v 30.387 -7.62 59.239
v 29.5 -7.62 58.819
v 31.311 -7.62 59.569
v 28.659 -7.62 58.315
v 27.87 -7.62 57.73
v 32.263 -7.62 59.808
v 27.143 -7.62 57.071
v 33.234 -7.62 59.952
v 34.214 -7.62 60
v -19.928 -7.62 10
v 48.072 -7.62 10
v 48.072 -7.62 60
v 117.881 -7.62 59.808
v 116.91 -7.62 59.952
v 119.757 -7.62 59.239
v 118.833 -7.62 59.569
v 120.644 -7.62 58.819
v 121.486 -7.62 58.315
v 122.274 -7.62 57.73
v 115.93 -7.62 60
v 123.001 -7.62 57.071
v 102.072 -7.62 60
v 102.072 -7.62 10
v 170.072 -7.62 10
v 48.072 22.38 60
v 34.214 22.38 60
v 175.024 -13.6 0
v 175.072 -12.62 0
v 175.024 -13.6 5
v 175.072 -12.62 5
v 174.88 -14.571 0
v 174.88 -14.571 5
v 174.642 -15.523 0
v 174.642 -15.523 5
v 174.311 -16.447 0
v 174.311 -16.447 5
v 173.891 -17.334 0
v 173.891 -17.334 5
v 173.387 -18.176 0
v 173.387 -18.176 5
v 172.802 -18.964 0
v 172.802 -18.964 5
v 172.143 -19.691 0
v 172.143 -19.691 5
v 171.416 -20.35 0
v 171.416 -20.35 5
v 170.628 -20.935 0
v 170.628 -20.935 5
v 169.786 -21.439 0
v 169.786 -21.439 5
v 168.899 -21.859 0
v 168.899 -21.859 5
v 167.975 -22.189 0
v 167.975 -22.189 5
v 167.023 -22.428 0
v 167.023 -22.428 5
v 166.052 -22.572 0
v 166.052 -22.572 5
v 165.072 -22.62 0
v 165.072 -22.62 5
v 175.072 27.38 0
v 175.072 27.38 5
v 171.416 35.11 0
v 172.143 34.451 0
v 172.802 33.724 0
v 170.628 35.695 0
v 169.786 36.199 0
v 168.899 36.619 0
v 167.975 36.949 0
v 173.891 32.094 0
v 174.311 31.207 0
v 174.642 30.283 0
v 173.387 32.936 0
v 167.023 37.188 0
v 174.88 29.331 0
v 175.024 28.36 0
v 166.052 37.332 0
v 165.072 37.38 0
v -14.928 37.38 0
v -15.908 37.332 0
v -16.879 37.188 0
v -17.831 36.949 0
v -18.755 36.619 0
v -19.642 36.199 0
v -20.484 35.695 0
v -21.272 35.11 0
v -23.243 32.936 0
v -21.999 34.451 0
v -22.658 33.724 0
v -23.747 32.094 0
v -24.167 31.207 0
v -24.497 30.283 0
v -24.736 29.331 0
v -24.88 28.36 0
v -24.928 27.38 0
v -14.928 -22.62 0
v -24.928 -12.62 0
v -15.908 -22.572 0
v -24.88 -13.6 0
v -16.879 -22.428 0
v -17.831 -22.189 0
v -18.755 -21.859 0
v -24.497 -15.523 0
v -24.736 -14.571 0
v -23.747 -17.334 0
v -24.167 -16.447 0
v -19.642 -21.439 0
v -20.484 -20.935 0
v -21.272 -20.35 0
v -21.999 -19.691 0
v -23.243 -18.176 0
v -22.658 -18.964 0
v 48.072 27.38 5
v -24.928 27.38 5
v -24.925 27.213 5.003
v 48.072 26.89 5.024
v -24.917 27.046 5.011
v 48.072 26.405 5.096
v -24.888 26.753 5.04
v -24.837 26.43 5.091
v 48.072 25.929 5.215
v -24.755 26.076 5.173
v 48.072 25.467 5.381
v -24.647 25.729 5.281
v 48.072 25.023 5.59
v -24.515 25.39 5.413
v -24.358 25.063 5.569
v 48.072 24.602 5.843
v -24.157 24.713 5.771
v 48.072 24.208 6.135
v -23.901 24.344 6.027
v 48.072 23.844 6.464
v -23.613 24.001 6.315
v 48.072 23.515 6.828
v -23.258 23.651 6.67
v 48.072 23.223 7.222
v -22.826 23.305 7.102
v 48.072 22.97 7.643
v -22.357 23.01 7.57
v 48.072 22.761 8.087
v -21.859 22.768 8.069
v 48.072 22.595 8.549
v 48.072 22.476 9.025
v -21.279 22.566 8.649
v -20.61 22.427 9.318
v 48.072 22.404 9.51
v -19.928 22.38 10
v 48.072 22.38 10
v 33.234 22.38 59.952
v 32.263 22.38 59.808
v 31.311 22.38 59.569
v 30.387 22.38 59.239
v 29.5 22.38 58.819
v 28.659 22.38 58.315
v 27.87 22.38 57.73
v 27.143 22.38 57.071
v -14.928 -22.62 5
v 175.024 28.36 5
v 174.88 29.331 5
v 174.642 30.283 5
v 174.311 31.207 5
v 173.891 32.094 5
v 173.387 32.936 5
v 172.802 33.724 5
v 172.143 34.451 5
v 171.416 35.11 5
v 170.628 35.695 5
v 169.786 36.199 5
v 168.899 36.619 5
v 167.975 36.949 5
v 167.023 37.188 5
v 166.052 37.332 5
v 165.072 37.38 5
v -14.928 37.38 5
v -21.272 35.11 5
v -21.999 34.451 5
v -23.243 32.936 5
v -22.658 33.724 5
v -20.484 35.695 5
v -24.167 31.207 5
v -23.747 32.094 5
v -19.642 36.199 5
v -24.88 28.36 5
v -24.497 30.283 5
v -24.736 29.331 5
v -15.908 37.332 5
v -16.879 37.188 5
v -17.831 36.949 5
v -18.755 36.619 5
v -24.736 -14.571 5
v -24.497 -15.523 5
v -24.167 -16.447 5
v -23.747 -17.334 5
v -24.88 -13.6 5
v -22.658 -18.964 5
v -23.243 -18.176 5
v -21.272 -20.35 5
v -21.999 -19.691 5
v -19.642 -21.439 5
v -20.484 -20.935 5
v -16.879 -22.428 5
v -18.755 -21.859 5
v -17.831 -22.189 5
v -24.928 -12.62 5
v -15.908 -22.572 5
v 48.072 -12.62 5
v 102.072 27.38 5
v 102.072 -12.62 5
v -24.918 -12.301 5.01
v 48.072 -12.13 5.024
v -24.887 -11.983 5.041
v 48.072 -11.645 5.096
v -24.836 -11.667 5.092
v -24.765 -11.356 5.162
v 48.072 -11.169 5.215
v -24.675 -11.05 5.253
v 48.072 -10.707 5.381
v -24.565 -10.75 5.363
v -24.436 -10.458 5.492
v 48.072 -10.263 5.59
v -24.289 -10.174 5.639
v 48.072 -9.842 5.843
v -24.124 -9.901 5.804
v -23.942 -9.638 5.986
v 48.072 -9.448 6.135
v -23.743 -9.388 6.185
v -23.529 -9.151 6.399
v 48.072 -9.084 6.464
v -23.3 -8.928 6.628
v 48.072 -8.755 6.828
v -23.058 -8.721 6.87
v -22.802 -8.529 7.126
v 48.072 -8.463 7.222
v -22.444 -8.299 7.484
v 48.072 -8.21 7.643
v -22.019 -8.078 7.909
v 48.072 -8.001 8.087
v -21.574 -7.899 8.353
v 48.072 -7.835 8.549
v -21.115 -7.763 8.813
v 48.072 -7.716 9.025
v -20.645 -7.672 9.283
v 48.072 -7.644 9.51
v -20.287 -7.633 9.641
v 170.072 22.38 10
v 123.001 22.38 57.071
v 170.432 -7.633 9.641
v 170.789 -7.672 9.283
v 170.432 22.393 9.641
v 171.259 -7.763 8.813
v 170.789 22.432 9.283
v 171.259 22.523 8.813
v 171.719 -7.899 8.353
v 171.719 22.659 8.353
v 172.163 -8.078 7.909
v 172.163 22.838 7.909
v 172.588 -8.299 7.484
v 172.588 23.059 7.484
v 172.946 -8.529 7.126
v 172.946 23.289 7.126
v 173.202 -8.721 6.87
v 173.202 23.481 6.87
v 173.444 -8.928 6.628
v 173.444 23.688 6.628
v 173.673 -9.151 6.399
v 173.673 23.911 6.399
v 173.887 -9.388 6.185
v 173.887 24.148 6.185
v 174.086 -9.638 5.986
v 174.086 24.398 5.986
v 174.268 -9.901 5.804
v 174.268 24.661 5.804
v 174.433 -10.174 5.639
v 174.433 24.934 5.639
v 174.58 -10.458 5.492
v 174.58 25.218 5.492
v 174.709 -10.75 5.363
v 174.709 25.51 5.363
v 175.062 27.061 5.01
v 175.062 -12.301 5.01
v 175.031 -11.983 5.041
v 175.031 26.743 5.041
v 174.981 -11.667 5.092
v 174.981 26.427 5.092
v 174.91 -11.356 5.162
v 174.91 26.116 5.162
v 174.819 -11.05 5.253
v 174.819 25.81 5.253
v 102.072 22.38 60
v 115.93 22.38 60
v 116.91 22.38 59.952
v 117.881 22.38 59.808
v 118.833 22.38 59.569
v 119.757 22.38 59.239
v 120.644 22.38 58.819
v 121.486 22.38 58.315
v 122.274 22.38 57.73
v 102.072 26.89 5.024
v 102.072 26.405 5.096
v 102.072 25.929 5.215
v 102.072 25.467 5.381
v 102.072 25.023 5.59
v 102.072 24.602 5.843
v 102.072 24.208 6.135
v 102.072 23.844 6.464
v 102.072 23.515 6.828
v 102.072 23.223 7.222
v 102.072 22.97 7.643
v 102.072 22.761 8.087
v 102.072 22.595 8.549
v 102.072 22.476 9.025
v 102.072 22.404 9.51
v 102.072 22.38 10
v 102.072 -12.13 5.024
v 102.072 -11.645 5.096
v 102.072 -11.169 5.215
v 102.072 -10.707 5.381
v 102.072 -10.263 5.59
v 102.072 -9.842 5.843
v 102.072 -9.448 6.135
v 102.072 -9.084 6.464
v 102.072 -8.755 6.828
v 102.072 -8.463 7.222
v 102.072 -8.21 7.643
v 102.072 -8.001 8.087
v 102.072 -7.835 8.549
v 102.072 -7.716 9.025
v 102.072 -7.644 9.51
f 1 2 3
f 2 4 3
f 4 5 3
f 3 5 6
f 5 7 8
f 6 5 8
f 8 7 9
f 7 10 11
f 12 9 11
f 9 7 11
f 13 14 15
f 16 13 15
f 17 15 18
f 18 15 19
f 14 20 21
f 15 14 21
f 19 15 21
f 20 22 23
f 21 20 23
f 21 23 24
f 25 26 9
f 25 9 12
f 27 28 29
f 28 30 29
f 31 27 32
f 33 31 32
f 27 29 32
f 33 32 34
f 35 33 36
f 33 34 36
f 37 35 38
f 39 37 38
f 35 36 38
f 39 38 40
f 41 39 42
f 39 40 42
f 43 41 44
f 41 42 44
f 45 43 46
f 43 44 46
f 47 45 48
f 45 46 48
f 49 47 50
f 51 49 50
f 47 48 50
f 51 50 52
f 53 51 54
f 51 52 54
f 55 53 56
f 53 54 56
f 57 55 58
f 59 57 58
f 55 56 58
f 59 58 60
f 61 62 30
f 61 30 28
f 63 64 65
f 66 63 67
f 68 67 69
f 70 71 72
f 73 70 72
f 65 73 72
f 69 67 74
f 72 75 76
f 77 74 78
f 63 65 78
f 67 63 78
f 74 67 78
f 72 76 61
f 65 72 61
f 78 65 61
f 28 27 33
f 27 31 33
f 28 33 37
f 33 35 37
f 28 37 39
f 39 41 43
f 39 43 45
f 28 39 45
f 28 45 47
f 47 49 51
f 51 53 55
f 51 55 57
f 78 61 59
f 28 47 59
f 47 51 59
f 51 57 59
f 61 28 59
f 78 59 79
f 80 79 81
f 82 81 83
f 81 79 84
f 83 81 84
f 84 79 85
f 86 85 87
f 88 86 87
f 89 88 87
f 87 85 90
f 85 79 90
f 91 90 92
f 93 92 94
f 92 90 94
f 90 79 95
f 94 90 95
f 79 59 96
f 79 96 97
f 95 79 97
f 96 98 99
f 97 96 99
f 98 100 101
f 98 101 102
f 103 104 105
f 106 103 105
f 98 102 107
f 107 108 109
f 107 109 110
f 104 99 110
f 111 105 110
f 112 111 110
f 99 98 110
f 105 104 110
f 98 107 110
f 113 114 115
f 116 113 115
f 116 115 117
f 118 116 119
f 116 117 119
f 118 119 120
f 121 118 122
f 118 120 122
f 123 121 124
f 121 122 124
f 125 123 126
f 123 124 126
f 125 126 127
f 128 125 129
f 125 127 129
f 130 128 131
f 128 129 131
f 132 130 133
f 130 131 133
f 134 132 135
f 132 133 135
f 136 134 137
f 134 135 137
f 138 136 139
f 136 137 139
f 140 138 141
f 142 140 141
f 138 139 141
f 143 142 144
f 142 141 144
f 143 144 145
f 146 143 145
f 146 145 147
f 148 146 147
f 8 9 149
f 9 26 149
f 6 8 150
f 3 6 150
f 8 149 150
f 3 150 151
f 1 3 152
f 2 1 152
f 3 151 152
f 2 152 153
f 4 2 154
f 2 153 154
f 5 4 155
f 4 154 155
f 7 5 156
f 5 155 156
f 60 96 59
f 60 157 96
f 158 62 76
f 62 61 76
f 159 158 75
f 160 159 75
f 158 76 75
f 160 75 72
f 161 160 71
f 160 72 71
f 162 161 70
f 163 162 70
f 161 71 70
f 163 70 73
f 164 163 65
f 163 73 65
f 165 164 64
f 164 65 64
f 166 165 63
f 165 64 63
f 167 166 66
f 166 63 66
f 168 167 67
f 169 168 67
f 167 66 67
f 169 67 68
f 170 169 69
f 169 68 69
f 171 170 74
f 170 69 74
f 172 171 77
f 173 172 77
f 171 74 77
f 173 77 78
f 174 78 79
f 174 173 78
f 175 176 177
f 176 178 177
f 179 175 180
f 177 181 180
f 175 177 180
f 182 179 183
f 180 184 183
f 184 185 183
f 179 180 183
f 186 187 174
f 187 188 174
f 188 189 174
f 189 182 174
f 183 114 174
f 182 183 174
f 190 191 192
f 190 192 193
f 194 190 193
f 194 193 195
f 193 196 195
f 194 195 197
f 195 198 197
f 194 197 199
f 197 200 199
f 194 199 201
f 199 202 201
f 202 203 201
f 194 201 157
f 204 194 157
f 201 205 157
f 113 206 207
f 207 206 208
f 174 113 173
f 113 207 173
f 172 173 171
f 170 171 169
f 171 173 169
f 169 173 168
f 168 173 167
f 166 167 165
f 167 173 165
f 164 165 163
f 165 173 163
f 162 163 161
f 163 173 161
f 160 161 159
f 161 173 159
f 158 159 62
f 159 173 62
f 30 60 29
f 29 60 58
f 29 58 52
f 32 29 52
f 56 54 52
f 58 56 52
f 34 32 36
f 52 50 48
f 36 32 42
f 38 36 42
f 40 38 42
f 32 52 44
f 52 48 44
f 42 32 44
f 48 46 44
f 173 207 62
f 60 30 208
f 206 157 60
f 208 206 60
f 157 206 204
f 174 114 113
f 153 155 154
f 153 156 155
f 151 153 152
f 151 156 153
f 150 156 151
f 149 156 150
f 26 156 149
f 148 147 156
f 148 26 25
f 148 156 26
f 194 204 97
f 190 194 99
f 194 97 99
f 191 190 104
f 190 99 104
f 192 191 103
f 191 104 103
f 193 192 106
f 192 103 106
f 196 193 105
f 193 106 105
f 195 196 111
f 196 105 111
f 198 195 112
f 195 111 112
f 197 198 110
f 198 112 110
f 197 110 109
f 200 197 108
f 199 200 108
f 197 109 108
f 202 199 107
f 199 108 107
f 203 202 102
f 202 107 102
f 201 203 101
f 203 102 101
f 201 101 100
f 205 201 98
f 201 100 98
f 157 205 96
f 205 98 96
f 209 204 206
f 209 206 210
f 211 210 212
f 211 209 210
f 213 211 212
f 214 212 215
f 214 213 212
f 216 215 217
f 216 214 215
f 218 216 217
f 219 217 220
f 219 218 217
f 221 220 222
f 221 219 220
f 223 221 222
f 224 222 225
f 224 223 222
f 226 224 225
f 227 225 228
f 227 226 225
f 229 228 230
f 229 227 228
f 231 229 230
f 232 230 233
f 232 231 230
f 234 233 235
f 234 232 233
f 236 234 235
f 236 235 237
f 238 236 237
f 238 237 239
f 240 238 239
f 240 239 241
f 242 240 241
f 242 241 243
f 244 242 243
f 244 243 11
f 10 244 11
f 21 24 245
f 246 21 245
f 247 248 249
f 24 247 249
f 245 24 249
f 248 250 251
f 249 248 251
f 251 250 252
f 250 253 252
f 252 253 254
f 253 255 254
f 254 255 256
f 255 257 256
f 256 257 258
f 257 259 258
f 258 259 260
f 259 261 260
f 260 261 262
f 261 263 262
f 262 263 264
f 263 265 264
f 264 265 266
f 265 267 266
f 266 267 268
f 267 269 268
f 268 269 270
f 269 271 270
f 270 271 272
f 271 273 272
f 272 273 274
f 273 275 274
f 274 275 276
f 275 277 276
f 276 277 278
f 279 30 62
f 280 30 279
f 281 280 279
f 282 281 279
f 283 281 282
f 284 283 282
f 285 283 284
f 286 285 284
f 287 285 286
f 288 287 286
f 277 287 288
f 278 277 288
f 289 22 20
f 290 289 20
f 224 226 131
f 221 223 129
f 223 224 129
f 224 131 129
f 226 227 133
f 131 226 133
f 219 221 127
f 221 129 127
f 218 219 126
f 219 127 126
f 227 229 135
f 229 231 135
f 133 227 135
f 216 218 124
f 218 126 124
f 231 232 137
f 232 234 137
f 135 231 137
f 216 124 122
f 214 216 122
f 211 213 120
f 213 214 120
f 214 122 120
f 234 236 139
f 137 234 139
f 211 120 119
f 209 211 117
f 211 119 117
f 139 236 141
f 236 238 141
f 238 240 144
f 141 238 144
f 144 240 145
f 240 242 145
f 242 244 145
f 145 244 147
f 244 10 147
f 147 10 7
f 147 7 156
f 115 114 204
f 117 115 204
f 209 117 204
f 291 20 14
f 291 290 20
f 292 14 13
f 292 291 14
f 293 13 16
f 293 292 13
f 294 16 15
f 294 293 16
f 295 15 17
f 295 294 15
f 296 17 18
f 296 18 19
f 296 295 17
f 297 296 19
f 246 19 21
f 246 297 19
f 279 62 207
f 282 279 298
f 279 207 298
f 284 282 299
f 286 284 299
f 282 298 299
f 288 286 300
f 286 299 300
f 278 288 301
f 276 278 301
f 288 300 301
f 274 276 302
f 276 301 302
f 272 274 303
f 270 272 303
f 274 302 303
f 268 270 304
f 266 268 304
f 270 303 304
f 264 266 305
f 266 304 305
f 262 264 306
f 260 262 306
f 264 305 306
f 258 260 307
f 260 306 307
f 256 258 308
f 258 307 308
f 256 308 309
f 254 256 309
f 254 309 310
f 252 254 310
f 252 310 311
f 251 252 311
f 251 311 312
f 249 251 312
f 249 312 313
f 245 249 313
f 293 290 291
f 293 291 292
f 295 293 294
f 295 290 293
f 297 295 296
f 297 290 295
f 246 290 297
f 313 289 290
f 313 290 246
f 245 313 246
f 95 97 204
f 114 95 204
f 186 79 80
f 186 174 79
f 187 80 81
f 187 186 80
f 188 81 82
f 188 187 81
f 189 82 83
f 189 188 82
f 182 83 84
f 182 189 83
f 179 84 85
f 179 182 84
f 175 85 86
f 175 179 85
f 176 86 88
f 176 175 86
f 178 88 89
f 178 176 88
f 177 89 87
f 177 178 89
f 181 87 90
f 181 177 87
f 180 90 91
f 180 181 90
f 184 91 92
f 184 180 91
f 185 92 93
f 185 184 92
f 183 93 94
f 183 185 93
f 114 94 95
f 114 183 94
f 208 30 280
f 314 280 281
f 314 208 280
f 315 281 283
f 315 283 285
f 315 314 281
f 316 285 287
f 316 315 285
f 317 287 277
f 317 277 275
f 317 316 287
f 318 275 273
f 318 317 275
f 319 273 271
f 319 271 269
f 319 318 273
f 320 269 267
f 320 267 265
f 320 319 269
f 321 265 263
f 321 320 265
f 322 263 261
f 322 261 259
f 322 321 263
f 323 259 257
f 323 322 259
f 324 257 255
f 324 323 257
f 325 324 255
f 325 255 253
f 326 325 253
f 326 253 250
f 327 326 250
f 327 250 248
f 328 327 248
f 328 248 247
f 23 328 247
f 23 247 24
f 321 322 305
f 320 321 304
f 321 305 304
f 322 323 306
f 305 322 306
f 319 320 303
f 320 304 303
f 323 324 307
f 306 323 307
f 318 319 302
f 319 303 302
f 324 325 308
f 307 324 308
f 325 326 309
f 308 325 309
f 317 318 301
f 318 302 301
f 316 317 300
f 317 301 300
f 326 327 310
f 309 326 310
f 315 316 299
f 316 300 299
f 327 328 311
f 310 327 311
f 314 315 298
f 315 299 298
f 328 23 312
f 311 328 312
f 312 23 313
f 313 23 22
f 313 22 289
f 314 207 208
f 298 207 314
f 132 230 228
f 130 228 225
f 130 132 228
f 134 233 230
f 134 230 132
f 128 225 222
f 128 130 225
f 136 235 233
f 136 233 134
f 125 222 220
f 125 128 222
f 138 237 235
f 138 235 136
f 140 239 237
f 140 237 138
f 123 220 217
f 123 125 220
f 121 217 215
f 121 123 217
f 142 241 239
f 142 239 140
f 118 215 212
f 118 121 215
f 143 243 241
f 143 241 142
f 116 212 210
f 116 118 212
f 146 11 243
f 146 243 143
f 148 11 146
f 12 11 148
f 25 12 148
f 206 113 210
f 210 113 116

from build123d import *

# Parameters (mm, degrees)
F0_W         = 200
F0_H         = 30
F1_DEPTH     = 60
F2_SIZE      = 55
F3_SIZE      = 55
F4_W         = 54
F4_H         = 30
F5_DEPTH     = 55
F7_DEPTH     = 15
F8_R         = 10
F9_R         = 4.99999
F11_DEPTH    = 15
F12_T4_DEPTH = 73
F12_T9_DEPTH = 73
F13_R        = 10


# Not quite as in the source:
# - a fillet or chamfer that OpenCascade refuses, or shapes differently, is made with other operations: its cross-section is extruded or revolved along the edge and cut away or added
# - a fillet or chamfer is up to 0.001 mm smaller than in the source, because OpenCascade refuses the exact size


with BuildPart() as f1:
    # F0 (on Top) → F1 (new body)
    with BuildSketch(Plane.XY):
        with Locations((75.0721136101, 7.3799993843)):
            Rectangle(F0_W, F0_H)
    extrude(amount=F1_DEPTH)

    # F2
    f2_edges = [f1.edges().sort_by_distance(p)[0] for p in [
        (175.072114, 7.379999, 60),
    ]]
    chamfer(f2_edges, length=F2_SIZE)

    # F3
    f3_edges = [f1.edges().sort_by_distance(p)[0] for p in [
        (-24.927886, 7.379999, 60),
    ]]
    chamfer(f3_edges, length=F3_SIZE)

    # F4 (on face) → F5 (cut)
    with BuildSketch(Plane.XY.offset(60)):
        with Locations((75.0721136101, 7.3799993843)):
            Rectangle(F4_W, F4_H)
    extrude(amount=-F5_DEPTH, mode=Mode.SUBTRACT)

    # F6 (on face) → F7 (join)
    with BuildSketch(Plane.XZ.offset(7.6200006157)):
        Polygon((48.0721136101, 5), (-24.9278863899, 5), (-24.9278863899, 0), (175.0721136101, 0), (175.0721136101, 5), (102.0721136101, 5), align=None)
    extrude(amount=F7_DEPTH)

    # F8
    f8_edges = [f1.edges().sort_by_distance(p)[0] for p in [
        (175.072114, -22.620001, 2.5),
        (-24.927886, -22.620001, 2.5),
    ]]
    fillet(f8_edges, radius=F8_R)

    # F9 (radius 5 in the source; OpenCascade refuses exactly that, so slightly less here)
    f9_edges = [f1.edges().sort_by_distance(p)[0] for p in [
        (138.572114, -7.620001, 5),
        (11.572114, -7.620001, 5),
    ]]
    fillet(f9_edges, radius=F9_R)

    # F10 (on face) → F11 (join)
    with BuildSketch(Plane(origin=(0, 22.3799993843, 0), x_dir=(-1, 0, 0), z_dir=(0, 1, 0))):
        Polygon((-102.0721136101, 5), (-175.0721136101, 5), (-175.0721136101, 0), (24.9278863899, 0), (24.9278863899, 5), (-48.0721136101, 5), align=None)
    extrude(amount=F11_DEPTH)

    # F12: fillet of radius 5 on 2 edges, made by hand


with BuildPart() as f12_tool2:
    # F12_s3 → F12_t4 (new body)
    with BuildSketch(Plane.YZ.offset(102.0721136101)):
        with BuildLine():
            ThreePointArc((27.3799993843, 5), (23.8444654784, 6.4644660941), (22.3799993843, 10))
            Line((22.3799993843, 10), (22.3799993843, 5))
            Line((22.3799993843, 5), (27.3799993843, 5))
        make_face()
    extrude(amount=F12_T4_DEPTH)

    split(bisect_by=Plane(origin=(90.0360568051, 0, 90.0360568051), x_dir=(0, 1, 0), z_dir=(-0.7071067812, 0, -0.7071067812)), keep=Keep.TOP)


with BuildPart() as f1_1:
    add(f1.part)

    # F12_t1: union F12_tool2
    add(f12_tool2.part)


with BuildPart() as f12_tool7:
    # F12_s8 → F12_t9 (new body)
    with BuildSketch(Plane.YZ.offset(-24.9278863899)):
        with BuildLine():
            ThreePointArc((27.3799993843, 5), (23.8444654784, 6.4644660941), (22.3799993843, 10))
            Line((22.3799993843, 10), (22.3799993843, 5))
            Line((22.3799993843, 5), (27.3799993843, 5))
        make_face()
    extrude(amount=F12_T9_DEPTH)

    split(bisect_by=Plane(origin=(-14.9639431949, 0, 14.9639431949), x_dir=(0, 1, 0), z_dir=(0.7071067812, 0, -0.7071067812)), keep=Keep.TOP)


with BuildPart() as f1_2:
    add(f1_1.part)

    # F12_t6: union F12_tool7
    add(f12_tool7.part)

    # F13
    f13_edges = [f1_2.edges().sort_by_distance(p)[0] for p in [
        (175.072114, 37.379999, 2.5),
        (-24.927886, 37.379999, 2.5),
        (120.072114, 7.379999, 60),
        (30.072114, 7.379999, 60),
    ]]
    fillet(f13_edges, radius=F13_R)


solid = f1_2.part
